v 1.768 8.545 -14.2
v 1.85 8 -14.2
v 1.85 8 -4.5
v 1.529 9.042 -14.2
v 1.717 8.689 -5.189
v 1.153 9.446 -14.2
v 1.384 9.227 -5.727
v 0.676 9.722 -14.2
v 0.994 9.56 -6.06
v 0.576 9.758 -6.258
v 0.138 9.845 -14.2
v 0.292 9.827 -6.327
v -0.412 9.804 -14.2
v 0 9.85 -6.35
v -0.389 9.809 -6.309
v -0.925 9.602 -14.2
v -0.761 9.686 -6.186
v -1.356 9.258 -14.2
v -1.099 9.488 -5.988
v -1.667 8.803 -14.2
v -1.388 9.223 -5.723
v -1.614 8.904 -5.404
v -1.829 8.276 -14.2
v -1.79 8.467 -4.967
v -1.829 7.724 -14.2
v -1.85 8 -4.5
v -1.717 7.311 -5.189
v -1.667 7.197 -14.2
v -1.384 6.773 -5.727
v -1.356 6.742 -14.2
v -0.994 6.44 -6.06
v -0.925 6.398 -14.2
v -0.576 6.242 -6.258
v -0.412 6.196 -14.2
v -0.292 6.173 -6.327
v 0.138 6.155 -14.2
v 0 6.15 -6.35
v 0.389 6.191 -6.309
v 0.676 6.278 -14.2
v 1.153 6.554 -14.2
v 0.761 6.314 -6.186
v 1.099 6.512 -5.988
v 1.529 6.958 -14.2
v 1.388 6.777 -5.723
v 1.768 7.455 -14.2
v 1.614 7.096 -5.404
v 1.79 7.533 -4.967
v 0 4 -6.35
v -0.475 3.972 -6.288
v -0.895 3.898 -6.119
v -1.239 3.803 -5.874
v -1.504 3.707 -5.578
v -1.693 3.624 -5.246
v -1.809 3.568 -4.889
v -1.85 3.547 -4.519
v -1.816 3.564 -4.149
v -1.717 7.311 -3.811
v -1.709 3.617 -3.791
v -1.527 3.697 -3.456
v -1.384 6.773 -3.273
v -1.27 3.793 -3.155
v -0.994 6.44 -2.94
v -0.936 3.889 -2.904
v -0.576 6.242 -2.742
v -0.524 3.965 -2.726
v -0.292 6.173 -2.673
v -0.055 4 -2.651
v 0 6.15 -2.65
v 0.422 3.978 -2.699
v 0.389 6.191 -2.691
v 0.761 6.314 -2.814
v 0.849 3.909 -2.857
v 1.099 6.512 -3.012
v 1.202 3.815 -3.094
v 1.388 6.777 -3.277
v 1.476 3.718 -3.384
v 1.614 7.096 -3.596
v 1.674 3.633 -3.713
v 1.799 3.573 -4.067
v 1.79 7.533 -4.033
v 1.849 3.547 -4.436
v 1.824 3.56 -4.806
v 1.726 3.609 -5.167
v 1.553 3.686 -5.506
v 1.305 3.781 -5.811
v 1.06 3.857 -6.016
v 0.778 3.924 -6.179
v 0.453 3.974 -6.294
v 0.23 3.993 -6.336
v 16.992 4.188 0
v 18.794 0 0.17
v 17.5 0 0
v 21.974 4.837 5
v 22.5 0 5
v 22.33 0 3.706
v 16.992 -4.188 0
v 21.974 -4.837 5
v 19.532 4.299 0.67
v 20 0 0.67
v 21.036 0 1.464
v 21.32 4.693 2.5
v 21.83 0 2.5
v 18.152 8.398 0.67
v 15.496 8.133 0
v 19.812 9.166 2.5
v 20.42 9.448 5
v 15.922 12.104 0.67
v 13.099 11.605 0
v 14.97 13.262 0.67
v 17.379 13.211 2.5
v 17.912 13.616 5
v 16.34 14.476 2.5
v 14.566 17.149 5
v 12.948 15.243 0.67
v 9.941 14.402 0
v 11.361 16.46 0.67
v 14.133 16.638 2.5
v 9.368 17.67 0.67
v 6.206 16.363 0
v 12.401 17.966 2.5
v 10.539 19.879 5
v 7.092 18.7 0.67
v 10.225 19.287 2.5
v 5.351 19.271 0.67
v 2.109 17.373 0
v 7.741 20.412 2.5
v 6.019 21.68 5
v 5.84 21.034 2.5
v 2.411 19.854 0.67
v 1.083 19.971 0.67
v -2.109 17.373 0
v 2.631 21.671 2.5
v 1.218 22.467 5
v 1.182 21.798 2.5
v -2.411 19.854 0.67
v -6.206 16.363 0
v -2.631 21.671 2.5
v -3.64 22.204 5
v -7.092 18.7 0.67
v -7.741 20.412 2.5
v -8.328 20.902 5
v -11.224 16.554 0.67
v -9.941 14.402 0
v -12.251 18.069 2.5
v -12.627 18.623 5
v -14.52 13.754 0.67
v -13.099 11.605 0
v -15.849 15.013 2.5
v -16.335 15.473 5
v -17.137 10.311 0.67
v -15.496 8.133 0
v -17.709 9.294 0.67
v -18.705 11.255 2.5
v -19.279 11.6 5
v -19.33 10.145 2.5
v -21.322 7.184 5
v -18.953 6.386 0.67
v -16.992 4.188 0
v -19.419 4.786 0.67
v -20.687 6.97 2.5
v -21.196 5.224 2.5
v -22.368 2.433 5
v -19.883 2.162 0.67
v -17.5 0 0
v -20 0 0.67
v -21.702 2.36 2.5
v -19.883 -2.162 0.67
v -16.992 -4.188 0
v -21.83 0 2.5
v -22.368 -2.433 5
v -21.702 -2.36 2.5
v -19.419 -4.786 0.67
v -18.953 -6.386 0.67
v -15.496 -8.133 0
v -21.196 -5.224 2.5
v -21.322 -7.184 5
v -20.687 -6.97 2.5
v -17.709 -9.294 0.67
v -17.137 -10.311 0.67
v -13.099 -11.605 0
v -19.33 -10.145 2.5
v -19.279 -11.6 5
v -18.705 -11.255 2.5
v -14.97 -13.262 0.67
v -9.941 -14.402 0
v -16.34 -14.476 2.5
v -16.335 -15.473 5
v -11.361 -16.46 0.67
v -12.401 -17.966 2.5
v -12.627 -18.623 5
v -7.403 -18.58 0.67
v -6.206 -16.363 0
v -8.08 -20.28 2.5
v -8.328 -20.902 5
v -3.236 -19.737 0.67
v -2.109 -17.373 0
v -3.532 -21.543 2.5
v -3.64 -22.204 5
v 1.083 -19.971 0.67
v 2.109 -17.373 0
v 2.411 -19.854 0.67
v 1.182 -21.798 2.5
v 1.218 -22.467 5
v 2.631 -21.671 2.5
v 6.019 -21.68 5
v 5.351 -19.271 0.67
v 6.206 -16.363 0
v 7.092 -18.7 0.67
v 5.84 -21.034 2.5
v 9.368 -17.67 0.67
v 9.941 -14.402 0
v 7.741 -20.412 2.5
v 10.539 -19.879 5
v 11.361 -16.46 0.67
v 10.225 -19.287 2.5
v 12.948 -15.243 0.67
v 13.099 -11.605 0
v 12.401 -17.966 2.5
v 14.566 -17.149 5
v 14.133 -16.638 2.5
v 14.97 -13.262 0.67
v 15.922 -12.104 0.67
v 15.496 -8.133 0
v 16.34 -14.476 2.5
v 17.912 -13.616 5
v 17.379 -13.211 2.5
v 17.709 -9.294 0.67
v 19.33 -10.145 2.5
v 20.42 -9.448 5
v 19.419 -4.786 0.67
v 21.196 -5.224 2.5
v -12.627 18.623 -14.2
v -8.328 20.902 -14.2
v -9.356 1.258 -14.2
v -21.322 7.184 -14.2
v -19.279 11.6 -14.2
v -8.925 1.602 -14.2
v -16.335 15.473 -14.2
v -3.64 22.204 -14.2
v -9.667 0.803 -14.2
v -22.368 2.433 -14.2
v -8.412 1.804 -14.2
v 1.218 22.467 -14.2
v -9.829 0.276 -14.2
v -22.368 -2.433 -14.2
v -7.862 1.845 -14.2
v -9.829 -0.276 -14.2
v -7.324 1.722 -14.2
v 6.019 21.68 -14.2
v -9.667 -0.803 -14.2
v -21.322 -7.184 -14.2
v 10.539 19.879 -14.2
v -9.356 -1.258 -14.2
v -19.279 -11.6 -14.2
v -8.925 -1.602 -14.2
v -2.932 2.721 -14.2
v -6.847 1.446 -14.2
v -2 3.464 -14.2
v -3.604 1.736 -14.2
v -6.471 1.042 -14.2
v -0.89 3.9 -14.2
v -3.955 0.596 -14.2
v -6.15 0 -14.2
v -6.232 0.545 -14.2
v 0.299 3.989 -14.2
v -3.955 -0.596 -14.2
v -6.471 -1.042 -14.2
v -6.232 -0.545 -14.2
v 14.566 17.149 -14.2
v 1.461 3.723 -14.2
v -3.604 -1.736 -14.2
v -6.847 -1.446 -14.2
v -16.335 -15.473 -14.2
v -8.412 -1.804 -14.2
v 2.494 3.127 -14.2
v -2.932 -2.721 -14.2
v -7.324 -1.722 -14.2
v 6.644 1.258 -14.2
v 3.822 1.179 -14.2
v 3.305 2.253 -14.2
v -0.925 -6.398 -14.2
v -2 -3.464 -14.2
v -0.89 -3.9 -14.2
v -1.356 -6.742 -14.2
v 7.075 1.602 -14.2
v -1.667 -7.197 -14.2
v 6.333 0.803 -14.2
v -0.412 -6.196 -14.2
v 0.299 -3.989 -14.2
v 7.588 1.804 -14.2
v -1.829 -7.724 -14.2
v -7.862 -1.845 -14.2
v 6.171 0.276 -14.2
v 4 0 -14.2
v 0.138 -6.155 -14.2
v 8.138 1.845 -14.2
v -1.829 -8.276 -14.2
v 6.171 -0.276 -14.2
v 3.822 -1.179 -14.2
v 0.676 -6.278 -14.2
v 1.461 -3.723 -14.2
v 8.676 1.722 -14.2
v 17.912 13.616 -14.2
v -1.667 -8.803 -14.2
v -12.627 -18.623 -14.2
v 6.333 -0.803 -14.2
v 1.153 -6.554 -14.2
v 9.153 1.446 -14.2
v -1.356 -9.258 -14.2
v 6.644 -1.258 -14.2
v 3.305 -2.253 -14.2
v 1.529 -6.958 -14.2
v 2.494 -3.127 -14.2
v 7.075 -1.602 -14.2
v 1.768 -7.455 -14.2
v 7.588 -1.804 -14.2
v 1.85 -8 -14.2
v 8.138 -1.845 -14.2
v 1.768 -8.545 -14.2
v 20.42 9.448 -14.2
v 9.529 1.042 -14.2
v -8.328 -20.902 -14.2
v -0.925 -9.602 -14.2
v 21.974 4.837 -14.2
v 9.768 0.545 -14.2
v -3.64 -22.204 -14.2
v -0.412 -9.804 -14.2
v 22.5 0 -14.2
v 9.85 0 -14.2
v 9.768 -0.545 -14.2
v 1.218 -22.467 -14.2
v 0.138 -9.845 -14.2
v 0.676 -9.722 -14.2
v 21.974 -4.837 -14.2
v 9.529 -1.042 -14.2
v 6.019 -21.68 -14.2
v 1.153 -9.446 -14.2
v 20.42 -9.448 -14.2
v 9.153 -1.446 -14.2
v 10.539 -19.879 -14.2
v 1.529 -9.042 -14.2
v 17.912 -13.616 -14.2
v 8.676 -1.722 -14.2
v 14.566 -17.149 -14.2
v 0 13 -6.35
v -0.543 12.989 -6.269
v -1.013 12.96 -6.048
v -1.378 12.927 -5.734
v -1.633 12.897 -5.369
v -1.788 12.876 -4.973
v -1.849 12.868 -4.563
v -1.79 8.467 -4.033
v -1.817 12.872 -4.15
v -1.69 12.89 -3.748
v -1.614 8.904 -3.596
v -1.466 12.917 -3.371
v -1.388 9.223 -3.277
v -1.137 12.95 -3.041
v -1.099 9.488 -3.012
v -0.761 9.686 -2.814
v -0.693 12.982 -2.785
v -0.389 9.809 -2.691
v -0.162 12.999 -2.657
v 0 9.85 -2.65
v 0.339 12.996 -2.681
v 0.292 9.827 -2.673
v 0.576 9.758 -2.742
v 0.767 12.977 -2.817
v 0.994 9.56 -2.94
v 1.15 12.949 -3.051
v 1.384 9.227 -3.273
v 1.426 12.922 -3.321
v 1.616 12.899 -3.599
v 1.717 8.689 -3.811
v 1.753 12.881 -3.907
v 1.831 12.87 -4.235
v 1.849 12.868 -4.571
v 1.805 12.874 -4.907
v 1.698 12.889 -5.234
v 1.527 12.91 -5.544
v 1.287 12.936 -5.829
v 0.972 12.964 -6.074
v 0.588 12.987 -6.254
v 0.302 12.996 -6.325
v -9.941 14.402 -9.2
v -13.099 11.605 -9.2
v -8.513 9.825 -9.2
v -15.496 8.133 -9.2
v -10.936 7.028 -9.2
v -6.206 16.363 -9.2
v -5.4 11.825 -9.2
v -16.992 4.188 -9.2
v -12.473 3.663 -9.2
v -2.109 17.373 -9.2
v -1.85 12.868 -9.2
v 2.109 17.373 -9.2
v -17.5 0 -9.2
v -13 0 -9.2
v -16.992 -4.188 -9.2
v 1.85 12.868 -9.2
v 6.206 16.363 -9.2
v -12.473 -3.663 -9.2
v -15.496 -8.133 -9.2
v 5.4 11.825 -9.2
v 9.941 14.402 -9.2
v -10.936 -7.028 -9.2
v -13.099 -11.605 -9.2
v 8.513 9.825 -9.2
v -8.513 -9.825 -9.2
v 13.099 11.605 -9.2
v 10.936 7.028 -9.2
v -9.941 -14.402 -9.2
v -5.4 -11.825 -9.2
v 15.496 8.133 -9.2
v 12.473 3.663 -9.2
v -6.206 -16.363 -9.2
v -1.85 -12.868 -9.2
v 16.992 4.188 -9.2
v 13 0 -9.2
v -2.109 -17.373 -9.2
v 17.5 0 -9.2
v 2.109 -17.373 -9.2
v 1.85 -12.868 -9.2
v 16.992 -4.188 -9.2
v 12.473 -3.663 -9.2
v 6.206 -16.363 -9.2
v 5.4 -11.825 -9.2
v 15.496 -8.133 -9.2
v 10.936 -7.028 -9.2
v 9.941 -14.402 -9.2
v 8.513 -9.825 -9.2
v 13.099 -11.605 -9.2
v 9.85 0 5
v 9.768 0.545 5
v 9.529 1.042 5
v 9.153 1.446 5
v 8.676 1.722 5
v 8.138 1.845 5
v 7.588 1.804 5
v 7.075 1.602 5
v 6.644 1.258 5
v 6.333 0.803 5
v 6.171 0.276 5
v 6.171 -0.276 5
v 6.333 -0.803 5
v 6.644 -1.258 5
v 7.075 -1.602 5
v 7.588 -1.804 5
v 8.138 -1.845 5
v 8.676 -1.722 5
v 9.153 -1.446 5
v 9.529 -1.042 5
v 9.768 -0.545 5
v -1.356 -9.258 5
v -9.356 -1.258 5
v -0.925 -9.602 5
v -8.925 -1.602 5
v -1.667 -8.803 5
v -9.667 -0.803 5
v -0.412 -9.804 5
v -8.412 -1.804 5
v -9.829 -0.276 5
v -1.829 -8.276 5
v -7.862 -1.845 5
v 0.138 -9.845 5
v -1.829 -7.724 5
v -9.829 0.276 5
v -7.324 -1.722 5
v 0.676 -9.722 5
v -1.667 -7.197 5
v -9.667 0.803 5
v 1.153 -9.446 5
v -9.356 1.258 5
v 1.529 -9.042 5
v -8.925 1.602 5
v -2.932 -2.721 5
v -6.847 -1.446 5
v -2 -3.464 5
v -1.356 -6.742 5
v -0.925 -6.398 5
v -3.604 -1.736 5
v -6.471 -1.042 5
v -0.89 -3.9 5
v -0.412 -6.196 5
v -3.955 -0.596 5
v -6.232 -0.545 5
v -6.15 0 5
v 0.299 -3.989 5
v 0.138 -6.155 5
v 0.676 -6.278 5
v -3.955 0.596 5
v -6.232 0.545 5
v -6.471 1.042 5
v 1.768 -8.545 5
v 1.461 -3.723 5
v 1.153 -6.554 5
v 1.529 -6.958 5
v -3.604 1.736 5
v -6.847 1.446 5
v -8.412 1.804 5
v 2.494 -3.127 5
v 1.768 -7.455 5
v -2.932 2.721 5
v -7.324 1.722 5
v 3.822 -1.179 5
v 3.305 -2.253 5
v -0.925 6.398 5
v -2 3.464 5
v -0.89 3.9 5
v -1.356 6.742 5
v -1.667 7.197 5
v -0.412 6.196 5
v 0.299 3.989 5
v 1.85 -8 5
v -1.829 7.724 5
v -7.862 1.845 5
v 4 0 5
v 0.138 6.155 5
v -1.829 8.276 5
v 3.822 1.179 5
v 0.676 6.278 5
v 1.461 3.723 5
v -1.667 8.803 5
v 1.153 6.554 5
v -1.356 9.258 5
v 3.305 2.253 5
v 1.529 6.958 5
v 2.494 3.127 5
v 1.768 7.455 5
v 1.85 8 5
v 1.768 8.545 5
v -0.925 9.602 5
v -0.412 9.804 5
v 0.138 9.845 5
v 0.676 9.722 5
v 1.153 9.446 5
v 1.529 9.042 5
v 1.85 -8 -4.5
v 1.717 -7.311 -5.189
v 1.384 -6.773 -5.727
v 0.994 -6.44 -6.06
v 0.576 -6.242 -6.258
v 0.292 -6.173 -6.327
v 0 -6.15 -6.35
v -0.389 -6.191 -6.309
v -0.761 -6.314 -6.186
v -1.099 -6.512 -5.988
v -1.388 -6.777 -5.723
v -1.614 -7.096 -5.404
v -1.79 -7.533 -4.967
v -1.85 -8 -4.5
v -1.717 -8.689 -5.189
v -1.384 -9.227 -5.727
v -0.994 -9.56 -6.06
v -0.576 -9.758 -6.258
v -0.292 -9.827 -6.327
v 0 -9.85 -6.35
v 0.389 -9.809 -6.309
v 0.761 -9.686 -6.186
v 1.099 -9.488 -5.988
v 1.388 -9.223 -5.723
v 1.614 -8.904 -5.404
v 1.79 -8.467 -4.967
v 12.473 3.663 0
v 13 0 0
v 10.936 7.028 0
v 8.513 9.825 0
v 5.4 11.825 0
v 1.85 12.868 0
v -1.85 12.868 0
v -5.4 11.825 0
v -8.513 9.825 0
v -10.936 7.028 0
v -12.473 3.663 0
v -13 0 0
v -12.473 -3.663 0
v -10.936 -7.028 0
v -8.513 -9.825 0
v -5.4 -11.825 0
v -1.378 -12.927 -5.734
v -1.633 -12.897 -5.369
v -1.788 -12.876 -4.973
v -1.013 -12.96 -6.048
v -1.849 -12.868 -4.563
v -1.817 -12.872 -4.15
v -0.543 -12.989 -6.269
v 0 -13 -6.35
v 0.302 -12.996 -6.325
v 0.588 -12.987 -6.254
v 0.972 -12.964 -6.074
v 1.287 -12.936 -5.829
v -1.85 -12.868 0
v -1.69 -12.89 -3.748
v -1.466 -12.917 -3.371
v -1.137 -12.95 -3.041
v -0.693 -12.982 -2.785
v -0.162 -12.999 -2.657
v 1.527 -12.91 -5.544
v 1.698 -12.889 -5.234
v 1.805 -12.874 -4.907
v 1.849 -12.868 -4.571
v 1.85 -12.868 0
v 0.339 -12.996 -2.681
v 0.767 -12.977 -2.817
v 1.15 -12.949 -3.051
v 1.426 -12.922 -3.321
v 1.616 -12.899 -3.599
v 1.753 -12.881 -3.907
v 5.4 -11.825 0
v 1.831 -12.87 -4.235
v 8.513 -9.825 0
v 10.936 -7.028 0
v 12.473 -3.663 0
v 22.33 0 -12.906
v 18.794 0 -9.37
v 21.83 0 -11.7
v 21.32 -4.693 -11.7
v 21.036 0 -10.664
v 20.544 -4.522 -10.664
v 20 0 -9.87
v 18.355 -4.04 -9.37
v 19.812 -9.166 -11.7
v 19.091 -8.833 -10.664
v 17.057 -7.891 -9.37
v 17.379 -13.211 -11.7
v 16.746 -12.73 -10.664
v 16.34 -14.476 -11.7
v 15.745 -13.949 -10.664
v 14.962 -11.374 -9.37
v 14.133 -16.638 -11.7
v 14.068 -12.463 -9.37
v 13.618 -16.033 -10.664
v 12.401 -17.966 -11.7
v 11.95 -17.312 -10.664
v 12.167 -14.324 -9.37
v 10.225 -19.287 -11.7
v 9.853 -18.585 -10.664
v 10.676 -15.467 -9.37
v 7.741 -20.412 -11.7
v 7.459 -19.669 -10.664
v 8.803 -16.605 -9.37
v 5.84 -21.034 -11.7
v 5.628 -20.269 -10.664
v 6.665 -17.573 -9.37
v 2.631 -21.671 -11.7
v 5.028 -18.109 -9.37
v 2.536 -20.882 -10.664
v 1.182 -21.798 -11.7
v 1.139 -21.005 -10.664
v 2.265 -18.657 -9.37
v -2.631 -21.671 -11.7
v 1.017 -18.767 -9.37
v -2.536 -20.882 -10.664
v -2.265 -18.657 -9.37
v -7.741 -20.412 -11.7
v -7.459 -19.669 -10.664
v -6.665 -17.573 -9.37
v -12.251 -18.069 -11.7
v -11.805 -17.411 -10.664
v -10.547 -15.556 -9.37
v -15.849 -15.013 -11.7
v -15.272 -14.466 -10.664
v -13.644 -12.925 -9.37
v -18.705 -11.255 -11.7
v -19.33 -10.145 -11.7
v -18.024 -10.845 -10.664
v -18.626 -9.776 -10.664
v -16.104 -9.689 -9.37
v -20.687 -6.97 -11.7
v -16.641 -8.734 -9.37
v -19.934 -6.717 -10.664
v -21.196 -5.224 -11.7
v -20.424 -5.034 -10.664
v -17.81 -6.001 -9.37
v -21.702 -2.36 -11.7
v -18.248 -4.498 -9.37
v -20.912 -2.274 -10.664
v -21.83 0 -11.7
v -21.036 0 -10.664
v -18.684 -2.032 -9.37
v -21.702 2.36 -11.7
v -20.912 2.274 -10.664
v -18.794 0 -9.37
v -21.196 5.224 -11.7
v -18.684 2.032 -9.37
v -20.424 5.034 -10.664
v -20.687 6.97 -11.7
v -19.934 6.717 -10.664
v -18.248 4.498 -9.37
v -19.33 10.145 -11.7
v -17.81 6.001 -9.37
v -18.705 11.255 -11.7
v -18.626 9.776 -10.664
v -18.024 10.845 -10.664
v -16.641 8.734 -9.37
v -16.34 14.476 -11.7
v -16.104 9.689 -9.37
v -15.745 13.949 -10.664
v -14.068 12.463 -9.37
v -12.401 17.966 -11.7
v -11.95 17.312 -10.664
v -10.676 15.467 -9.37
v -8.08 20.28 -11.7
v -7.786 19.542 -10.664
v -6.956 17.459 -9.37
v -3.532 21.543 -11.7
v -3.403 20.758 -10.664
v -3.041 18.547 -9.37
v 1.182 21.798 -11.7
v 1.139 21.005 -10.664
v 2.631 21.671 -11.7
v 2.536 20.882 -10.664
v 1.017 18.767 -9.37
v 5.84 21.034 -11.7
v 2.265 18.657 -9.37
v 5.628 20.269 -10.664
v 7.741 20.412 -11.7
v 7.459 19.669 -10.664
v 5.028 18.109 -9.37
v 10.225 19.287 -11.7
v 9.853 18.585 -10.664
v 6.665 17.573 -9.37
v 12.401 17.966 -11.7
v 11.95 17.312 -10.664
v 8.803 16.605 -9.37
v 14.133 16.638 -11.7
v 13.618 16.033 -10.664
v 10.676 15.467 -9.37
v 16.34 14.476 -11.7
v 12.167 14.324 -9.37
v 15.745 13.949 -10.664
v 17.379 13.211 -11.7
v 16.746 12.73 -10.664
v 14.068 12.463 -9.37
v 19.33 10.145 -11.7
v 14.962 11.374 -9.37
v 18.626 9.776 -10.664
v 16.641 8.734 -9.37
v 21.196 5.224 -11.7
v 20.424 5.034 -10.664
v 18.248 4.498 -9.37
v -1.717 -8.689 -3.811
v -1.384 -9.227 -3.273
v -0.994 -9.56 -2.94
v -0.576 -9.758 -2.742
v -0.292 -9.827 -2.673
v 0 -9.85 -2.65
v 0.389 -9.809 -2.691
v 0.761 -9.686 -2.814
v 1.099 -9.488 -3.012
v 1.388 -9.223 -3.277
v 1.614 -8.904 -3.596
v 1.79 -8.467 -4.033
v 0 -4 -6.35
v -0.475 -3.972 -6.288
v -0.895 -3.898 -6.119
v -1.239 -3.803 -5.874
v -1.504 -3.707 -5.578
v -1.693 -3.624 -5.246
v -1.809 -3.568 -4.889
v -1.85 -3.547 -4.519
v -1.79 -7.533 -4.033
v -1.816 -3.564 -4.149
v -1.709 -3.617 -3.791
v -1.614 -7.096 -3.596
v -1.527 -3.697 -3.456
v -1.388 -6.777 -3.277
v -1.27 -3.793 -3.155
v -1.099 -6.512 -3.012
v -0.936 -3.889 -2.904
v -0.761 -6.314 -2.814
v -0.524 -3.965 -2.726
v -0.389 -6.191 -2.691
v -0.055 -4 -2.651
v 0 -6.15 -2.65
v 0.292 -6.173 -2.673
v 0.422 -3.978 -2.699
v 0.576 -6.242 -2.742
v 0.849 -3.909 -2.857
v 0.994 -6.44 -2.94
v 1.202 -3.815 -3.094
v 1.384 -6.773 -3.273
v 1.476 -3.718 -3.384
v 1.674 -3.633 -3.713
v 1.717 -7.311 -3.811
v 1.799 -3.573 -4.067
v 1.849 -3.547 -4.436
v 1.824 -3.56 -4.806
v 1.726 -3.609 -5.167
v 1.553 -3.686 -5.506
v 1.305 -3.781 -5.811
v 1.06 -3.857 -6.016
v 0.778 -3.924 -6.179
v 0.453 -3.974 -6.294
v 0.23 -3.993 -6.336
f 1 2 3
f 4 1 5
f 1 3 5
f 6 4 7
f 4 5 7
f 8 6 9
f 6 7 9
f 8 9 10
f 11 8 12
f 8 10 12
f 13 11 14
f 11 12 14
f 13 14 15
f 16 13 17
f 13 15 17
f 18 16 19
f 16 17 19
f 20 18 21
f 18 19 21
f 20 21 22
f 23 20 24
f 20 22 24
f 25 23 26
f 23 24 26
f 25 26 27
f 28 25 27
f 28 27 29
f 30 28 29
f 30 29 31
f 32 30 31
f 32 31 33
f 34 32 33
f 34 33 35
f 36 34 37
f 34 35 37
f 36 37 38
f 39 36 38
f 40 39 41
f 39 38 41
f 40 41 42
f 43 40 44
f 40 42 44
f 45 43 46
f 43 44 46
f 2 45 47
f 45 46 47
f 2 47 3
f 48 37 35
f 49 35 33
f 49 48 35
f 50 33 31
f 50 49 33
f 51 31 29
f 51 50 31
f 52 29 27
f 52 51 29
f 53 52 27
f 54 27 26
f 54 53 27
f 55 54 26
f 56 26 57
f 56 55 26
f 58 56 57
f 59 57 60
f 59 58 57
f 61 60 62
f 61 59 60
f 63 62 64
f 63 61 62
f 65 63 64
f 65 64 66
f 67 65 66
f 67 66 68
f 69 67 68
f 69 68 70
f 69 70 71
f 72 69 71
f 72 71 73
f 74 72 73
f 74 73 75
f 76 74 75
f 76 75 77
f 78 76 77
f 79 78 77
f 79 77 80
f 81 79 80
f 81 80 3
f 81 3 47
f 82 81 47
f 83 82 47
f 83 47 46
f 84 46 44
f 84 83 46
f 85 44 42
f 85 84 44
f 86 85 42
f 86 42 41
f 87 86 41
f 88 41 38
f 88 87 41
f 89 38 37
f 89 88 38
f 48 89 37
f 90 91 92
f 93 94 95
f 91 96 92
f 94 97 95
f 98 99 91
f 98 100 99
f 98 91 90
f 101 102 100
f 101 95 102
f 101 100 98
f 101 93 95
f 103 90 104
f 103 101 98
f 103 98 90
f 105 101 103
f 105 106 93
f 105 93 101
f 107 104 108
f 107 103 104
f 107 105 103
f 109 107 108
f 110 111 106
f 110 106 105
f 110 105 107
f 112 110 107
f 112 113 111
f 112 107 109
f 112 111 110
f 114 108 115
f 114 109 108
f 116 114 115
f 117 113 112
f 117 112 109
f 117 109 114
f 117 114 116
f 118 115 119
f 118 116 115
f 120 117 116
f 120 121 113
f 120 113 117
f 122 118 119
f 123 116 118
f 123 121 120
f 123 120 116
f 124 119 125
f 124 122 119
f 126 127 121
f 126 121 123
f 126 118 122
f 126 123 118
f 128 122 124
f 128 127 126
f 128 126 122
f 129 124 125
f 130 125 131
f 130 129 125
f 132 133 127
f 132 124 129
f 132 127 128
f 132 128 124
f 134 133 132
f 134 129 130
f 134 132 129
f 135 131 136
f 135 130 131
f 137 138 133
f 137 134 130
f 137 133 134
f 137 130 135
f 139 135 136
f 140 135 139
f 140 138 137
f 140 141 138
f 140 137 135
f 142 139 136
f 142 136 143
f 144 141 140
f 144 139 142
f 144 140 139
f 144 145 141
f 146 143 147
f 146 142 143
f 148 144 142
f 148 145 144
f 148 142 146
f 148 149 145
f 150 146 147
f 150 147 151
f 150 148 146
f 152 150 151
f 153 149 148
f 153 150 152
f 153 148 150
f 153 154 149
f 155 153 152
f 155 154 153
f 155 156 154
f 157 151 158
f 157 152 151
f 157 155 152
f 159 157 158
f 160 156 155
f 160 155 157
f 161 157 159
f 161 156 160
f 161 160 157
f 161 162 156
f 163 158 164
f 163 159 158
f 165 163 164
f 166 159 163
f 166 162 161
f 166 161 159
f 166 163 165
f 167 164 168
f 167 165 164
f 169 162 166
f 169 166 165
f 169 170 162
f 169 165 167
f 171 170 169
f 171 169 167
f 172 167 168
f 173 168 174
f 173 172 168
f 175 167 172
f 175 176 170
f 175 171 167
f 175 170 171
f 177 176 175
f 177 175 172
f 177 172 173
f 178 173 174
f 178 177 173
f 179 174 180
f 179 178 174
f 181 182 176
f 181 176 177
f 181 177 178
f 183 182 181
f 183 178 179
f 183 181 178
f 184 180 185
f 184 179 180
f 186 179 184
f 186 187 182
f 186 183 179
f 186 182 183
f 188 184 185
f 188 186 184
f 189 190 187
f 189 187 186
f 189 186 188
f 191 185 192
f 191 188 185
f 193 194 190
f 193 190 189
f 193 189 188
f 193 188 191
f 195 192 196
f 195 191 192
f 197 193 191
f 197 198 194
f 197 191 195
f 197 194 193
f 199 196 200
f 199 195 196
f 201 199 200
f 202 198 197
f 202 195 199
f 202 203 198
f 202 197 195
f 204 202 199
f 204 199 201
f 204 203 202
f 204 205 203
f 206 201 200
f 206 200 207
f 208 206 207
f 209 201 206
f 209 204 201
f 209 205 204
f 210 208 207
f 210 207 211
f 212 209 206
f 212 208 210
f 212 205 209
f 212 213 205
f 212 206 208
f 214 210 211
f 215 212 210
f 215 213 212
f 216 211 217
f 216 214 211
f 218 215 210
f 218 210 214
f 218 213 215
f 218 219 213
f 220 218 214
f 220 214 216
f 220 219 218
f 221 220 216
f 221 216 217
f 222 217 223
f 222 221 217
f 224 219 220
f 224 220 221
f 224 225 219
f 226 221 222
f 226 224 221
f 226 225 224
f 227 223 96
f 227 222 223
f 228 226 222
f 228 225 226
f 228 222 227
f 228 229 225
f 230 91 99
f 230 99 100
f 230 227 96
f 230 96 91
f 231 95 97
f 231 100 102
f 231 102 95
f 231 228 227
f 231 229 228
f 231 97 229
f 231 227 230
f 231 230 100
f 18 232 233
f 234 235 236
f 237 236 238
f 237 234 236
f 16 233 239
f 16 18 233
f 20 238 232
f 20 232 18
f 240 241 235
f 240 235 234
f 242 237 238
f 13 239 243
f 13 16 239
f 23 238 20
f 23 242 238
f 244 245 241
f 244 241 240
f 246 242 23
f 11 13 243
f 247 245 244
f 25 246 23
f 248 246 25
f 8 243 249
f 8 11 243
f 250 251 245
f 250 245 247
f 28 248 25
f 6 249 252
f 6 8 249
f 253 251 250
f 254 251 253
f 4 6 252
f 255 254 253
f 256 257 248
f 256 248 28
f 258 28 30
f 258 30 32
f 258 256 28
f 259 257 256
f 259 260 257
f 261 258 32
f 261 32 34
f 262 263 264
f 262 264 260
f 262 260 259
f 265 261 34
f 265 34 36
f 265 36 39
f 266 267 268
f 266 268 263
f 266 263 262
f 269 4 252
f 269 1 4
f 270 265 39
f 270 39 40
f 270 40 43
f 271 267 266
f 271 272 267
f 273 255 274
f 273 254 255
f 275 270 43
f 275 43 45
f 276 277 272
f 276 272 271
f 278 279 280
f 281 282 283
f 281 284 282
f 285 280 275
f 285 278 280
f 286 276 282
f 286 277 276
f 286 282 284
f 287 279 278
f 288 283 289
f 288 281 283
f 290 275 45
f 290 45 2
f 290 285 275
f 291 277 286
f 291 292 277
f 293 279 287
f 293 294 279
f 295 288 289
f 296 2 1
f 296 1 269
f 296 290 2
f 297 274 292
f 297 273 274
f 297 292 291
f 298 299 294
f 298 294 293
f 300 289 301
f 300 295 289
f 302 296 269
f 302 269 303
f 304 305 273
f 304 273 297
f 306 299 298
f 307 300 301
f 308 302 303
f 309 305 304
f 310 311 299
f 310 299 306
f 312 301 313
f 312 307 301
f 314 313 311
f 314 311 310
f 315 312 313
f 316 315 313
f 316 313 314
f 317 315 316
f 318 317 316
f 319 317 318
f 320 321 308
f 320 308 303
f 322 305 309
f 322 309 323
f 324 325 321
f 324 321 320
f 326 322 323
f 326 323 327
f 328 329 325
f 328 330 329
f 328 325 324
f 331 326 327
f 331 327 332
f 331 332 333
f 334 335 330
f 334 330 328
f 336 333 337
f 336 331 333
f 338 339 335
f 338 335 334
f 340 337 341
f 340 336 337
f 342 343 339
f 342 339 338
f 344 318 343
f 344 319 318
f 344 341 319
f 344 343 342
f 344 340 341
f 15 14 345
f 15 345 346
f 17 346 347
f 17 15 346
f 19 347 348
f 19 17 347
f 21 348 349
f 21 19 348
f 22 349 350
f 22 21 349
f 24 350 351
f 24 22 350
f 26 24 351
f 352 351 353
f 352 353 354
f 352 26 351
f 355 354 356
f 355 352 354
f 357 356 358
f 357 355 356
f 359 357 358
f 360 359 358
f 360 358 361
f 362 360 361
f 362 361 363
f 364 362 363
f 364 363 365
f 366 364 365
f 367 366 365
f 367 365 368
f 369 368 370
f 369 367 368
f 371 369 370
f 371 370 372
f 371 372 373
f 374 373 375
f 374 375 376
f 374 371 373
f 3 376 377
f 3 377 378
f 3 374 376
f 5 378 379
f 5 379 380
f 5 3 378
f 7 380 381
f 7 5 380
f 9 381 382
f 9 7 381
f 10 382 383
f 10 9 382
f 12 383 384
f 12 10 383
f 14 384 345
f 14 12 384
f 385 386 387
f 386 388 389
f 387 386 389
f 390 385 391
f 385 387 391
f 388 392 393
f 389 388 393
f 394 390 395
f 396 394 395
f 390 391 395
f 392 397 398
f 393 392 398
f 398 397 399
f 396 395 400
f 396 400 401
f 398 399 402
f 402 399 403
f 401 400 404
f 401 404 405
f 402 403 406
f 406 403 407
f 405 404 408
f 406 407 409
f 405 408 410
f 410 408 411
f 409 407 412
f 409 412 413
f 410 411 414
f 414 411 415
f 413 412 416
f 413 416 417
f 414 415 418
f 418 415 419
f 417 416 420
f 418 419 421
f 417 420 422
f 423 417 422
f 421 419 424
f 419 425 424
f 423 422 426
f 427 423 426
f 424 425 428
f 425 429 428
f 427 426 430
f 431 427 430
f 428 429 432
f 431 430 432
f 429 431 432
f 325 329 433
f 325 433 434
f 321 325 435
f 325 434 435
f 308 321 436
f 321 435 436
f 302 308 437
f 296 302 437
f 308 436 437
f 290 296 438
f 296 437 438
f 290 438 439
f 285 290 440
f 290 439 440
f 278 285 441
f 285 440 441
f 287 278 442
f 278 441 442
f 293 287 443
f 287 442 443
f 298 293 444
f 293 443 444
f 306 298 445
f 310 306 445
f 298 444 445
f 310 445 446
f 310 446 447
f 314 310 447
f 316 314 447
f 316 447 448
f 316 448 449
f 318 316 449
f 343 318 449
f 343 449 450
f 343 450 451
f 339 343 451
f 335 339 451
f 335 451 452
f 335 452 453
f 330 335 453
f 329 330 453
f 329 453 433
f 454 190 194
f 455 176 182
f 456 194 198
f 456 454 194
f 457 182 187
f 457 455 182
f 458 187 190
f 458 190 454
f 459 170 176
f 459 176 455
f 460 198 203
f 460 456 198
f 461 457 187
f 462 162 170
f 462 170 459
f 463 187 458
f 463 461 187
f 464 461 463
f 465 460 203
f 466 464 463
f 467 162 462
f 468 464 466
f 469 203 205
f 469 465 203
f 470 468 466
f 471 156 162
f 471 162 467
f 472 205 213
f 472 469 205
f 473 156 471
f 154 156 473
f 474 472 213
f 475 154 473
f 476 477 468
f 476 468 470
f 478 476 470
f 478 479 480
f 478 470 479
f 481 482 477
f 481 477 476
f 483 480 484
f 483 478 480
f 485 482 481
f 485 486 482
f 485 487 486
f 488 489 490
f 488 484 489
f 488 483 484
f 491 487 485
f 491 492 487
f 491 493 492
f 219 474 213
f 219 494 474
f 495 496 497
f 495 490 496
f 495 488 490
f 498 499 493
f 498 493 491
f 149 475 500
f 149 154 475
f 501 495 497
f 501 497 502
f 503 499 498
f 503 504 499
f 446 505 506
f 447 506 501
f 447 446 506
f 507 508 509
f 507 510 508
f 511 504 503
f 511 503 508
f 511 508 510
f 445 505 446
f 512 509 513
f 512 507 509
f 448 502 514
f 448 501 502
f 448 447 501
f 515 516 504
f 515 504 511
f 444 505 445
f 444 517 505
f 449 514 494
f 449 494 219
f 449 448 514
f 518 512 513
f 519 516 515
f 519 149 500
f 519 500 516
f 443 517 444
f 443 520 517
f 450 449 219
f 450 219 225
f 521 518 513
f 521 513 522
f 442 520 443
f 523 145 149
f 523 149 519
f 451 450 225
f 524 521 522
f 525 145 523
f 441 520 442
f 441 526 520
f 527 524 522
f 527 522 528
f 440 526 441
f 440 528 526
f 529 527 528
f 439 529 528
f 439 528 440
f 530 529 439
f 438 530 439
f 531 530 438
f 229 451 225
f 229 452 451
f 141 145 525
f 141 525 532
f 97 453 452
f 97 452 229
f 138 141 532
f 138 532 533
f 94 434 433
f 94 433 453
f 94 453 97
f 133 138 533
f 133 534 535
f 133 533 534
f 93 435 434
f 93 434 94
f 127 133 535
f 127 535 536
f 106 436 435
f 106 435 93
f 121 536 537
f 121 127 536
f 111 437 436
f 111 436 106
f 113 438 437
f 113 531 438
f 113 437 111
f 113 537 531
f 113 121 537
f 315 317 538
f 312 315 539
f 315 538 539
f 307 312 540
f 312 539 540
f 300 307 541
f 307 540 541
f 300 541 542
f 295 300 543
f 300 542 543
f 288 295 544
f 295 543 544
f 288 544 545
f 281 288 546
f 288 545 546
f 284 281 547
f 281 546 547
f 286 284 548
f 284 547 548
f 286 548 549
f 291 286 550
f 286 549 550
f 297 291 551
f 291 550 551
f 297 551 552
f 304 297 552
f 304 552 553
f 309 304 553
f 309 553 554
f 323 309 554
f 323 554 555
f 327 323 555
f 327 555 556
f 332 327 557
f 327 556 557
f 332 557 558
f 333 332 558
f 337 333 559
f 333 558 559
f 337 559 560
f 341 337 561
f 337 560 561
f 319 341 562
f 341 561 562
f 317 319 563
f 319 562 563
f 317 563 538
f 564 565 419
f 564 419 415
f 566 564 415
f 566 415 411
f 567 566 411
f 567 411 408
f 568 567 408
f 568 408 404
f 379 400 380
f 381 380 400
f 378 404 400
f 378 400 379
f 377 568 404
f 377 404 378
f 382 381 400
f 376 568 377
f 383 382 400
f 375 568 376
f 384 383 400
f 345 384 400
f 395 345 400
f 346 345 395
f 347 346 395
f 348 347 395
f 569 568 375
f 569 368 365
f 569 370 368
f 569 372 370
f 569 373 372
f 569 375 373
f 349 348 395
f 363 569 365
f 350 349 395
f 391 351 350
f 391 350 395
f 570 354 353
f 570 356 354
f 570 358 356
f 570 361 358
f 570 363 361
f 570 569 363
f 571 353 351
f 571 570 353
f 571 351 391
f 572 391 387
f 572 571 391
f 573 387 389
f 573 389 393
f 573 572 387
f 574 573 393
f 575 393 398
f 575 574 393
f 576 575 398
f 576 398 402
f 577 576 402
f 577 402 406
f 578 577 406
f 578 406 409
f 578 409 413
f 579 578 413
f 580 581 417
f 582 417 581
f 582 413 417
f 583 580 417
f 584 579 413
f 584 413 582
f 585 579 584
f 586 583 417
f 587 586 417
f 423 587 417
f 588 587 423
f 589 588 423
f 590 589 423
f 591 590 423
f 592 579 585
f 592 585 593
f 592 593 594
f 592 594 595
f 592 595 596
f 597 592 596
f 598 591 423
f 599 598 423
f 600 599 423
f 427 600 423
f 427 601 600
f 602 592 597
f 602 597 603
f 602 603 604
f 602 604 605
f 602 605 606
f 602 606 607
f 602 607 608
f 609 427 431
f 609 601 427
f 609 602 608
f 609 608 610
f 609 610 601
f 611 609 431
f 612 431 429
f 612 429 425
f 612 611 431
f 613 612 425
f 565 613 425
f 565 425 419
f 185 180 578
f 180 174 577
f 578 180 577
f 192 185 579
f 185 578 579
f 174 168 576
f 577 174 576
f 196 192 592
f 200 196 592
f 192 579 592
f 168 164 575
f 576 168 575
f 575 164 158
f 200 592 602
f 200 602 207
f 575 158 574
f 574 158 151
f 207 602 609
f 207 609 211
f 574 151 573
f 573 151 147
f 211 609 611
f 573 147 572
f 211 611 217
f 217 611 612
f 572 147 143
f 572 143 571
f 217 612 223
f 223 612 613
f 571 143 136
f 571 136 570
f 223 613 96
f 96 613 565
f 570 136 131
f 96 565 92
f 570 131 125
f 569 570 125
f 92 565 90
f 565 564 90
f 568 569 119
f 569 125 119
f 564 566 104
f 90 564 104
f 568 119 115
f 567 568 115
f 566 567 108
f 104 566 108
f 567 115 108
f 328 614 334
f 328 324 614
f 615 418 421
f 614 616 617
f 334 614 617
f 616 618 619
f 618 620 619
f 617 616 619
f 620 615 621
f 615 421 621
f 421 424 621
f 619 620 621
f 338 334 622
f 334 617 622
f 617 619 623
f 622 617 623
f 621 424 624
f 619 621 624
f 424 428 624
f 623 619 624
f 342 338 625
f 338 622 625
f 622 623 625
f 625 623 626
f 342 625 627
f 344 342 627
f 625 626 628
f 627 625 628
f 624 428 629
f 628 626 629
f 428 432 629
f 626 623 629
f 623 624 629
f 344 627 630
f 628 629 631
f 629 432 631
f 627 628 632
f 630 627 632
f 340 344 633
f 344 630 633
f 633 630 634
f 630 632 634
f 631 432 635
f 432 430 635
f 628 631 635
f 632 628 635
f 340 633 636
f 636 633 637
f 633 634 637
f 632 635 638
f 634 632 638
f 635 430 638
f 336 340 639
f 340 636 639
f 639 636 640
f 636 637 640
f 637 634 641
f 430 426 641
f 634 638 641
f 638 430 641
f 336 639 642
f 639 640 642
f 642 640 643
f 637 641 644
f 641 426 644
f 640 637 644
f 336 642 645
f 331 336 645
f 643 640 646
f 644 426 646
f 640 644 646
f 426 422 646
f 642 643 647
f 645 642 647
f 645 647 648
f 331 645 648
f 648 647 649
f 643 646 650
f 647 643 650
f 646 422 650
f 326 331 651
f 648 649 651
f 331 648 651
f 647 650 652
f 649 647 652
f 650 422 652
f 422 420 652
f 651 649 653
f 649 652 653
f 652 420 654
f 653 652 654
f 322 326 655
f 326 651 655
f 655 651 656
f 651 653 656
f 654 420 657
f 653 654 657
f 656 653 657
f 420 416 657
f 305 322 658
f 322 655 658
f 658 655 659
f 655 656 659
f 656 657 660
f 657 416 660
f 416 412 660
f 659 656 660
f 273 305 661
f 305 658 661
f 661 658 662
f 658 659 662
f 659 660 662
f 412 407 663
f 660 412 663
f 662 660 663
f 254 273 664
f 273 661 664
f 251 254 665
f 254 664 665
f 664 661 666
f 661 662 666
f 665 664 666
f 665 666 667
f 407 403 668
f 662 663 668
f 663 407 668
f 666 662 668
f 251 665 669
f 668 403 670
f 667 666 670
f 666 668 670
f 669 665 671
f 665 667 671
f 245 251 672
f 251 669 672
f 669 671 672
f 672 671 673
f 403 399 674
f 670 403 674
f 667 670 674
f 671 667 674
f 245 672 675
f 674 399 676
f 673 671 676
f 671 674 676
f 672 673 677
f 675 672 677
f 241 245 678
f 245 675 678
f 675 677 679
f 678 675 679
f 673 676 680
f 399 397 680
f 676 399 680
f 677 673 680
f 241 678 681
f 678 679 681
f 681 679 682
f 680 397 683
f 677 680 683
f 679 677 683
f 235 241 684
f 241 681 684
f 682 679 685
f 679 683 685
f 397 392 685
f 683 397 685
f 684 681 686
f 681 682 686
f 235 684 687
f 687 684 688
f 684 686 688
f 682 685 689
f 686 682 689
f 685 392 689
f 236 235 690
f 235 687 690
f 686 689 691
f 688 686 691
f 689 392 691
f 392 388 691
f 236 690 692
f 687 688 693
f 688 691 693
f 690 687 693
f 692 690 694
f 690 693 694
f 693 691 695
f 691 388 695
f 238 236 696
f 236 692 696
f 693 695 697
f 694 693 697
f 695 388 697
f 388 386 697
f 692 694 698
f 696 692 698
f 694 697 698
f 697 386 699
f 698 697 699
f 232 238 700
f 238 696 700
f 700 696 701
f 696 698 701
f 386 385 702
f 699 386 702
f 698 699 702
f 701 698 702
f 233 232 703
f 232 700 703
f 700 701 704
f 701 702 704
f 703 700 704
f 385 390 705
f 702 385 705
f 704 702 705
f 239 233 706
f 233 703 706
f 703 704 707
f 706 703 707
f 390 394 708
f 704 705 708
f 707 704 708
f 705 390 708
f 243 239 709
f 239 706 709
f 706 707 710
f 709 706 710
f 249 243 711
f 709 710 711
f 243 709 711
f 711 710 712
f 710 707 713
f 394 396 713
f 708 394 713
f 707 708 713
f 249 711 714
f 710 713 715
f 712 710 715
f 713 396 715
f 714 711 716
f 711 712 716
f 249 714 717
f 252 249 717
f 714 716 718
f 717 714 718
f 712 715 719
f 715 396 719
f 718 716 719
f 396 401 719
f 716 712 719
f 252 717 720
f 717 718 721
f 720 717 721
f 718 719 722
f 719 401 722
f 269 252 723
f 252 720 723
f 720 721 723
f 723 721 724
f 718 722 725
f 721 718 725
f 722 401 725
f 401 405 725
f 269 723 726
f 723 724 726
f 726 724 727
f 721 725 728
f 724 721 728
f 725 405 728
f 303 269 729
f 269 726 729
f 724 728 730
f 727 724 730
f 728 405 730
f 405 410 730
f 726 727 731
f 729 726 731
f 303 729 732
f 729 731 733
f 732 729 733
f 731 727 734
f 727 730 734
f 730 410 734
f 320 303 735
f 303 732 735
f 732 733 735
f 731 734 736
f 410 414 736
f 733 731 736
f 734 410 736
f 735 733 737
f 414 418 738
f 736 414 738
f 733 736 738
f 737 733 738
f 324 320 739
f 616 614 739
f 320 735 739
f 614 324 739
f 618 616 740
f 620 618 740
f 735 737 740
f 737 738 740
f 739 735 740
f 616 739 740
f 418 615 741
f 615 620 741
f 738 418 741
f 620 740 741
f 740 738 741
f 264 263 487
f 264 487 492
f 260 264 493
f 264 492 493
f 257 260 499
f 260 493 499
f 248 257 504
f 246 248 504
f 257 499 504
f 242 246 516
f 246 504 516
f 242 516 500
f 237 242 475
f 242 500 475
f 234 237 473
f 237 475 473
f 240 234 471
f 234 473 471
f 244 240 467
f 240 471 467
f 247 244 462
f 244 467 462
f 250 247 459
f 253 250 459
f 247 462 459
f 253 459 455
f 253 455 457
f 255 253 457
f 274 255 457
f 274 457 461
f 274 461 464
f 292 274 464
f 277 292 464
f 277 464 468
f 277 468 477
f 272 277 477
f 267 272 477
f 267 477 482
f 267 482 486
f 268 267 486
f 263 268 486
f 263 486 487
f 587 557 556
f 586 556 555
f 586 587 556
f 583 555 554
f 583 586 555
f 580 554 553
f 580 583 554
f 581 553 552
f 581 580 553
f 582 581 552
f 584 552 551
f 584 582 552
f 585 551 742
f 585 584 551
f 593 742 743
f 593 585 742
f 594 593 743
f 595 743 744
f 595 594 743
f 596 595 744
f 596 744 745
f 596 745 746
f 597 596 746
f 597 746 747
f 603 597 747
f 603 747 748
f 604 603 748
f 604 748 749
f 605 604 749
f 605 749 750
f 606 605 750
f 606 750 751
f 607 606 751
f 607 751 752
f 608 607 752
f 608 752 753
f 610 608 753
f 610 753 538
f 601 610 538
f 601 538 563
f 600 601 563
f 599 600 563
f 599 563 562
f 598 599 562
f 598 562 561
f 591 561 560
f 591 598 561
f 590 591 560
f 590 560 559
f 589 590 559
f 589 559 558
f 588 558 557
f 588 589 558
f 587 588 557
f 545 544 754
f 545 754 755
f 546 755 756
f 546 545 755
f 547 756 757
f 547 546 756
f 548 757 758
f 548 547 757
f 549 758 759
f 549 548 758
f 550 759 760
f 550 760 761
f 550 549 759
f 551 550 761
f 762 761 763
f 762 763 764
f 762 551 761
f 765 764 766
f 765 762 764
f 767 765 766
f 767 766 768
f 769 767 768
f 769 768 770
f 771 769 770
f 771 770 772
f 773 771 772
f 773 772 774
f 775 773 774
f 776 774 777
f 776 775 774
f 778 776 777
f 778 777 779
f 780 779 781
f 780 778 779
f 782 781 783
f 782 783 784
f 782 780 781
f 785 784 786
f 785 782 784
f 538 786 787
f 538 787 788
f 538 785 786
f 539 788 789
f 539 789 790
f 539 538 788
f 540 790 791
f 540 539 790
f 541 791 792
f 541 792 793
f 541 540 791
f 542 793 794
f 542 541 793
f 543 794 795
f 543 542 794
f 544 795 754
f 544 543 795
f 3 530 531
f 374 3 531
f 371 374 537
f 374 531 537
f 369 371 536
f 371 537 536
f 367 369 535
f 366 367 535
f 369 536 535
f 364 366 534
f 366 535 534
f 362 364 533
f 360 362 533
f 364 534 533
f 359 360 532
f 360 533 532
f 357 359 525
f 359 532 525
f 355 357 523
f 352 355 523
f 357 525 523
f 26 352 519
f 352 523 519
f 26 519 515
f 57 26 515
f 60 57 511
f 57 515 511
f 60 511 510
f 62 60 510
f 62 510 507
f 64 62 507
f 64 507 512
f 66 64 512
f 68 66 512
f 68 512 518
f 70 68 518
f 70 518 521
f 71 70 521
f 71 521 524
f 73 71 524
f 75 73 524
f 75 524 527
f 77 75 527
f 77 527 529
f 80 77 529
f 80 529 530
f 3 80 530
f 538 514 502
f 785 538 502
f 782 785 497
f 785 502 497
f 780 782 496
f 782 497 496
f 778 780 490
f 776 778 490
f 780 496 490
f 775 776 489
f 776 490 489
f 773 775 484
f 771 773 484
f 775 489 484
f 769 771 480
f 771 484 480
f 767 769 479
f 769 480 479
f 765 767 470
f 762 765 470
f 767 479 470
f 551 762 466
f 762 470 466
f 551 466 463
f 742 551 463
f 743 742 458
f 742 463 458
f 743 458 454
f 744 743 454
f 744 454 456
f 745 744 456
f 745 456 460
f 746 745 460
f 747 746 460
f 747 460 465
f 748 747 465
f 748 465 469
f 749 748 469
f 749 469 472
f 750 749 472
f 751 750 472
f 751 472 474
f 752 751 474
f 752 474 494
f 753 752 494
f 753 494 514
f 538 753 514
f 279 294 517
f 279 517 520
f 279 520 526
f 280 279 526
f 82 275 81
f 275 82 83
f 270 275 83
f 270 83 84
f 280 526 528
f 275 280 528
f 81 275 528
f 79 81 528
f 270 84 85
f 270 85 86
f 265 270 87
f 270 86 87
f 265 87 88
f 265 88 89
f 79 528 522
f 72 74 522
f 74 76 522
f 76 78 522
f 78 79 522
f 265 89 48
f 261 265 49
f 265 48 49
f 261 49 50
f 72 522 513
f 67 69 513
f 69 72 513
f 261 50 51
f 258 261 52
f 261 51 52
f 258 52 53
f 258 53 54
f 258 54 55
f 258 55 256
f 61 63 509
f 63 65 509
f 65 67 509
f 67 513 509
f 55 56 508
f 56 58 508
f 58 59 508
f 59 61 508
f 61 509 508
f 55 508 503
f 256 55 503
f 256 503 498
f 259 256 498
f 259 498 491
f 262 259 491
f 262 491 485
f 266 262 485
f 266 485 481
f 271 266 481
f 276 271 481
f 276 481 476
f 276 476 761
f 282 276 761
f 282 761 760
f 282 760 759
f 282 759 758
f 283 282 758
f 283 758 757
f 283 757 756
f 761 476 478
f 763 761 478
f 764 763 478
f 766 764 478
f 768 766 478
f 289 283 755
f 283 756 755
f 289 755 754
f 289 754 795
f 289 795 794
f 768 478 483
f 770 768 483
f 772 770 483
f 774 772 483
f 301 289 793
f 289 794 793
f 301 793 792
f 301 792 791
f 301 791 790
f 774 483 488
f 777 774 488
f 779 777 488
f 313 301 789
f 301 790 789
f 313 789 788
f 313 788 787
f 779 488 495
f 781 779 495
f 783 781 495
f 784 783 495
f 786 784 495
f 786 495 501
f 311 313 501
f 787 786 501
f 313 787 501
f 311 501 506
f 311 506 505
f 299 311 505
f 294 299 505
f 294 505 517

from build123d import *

# Parameters (mm, degrees)
SKETCH1_R               = 22.5
BOSS_EXTRUDE1_DEPTH     = 5
SKETCH2_R               = 13
BOSS_EXTRUDE2_DEPTH     = 9.2
BOSS_EXTRUDE4_START     = 5
SKETCH5_R               = 22.5
BOSS_EXTRUDE4_DEPTH     = 5
SKETCH6_R               = 4
SKETCH6_R_2             = 1.85
CUT_EXTRUDE1_DEPTH      = 38.163691959
FILLET1_R               = 5
CUT_EXTRUDE2_DEPTH      = 26
CUT_EXTRUDE2_DEPTH_BACK = 26
SKETCH8_R               = 1.85


with BuildPart() as part:
    # Sketch1 → Boss-Extrude1 (new body)
    with BuildSketch(Plane.XY):
        Circle(SKETCH1_R)
    extrude(amount=BOSS_EXTRUDE1_DEPTH)

    # Sketch2 → Boss-Extrude2 (add)
    with BuildSketch(Plane.XY):
        Circle(SKETCH2_R)
    extrude(amount=-BOSS_EXTRUDE2_DEPTH)

    # Sketch5 → Boss-Extrude4 (add)
    with BuildSketch(Plane(origin=(0, 0, -9.2), x_dir=(-1, 0, 0), z_dir=(0, 0, -1)).offset(BOSS_EXTRUDE4_START)):
        with Locations(Location((0, 0, 0), (0, 0, 180))):
            Circle(SKETCH5_R)
    extrude(amount=-BOSS_EXTRUDE4_DEPTH)

    # Sketch6 → Cut-Extrude1 (cut, through all)
    with BuildSketch(Plane.XY.offset(5)):
        Circle(SKETCH6_R)
        with Locations((0, 8)):
            Circle(SKETCH6_R_2)
        with Locations((8, 0)):
            Circle(SKETCH6_R_2)
        with Locations((0, -8)):
            Circle(SKETCH6_R_2)
        with Locations((-8, 0)):
            Circle(SKETCH6_R_2)
    extrude(amount=-CUT_EXTRUDE1_DEPTH, mode=Mode.SUBTRACT)

    # Fillet1
    fillet1_edges = [part.edges().sort_by_distance(p)[0] for p in [
        (-22.5, 0, 0),
        (-22.5, 0, -9.2),
    ]]
    fillet(fillet1_edges, radius=FILLET1_R - 0.0001)  # a hair under: the kernel refuses the full size

    # Sketch8 → Cut-Extrude2 (cut, two sides: drawn at the far end of the back side and taken through both)
    with BuildSketch(Plane(origin=(0, 0, 0), x_dir=(1, 0, 0), z_dir=(0, 1, 0)).offset(-CUT_EXTRUDE2_DEPTH_BACK)):
        with Locations(Location((0, 4.5, 0), (0, 0, 90))):
            Circle(SKETCH8_R)
    extrude(amount=CUT_EXTRUDE2_DEPTH + CUT_EXTRUDE2_DEPTH_BACK, mode=Mode.SUBTRACT)


solid = part.part
